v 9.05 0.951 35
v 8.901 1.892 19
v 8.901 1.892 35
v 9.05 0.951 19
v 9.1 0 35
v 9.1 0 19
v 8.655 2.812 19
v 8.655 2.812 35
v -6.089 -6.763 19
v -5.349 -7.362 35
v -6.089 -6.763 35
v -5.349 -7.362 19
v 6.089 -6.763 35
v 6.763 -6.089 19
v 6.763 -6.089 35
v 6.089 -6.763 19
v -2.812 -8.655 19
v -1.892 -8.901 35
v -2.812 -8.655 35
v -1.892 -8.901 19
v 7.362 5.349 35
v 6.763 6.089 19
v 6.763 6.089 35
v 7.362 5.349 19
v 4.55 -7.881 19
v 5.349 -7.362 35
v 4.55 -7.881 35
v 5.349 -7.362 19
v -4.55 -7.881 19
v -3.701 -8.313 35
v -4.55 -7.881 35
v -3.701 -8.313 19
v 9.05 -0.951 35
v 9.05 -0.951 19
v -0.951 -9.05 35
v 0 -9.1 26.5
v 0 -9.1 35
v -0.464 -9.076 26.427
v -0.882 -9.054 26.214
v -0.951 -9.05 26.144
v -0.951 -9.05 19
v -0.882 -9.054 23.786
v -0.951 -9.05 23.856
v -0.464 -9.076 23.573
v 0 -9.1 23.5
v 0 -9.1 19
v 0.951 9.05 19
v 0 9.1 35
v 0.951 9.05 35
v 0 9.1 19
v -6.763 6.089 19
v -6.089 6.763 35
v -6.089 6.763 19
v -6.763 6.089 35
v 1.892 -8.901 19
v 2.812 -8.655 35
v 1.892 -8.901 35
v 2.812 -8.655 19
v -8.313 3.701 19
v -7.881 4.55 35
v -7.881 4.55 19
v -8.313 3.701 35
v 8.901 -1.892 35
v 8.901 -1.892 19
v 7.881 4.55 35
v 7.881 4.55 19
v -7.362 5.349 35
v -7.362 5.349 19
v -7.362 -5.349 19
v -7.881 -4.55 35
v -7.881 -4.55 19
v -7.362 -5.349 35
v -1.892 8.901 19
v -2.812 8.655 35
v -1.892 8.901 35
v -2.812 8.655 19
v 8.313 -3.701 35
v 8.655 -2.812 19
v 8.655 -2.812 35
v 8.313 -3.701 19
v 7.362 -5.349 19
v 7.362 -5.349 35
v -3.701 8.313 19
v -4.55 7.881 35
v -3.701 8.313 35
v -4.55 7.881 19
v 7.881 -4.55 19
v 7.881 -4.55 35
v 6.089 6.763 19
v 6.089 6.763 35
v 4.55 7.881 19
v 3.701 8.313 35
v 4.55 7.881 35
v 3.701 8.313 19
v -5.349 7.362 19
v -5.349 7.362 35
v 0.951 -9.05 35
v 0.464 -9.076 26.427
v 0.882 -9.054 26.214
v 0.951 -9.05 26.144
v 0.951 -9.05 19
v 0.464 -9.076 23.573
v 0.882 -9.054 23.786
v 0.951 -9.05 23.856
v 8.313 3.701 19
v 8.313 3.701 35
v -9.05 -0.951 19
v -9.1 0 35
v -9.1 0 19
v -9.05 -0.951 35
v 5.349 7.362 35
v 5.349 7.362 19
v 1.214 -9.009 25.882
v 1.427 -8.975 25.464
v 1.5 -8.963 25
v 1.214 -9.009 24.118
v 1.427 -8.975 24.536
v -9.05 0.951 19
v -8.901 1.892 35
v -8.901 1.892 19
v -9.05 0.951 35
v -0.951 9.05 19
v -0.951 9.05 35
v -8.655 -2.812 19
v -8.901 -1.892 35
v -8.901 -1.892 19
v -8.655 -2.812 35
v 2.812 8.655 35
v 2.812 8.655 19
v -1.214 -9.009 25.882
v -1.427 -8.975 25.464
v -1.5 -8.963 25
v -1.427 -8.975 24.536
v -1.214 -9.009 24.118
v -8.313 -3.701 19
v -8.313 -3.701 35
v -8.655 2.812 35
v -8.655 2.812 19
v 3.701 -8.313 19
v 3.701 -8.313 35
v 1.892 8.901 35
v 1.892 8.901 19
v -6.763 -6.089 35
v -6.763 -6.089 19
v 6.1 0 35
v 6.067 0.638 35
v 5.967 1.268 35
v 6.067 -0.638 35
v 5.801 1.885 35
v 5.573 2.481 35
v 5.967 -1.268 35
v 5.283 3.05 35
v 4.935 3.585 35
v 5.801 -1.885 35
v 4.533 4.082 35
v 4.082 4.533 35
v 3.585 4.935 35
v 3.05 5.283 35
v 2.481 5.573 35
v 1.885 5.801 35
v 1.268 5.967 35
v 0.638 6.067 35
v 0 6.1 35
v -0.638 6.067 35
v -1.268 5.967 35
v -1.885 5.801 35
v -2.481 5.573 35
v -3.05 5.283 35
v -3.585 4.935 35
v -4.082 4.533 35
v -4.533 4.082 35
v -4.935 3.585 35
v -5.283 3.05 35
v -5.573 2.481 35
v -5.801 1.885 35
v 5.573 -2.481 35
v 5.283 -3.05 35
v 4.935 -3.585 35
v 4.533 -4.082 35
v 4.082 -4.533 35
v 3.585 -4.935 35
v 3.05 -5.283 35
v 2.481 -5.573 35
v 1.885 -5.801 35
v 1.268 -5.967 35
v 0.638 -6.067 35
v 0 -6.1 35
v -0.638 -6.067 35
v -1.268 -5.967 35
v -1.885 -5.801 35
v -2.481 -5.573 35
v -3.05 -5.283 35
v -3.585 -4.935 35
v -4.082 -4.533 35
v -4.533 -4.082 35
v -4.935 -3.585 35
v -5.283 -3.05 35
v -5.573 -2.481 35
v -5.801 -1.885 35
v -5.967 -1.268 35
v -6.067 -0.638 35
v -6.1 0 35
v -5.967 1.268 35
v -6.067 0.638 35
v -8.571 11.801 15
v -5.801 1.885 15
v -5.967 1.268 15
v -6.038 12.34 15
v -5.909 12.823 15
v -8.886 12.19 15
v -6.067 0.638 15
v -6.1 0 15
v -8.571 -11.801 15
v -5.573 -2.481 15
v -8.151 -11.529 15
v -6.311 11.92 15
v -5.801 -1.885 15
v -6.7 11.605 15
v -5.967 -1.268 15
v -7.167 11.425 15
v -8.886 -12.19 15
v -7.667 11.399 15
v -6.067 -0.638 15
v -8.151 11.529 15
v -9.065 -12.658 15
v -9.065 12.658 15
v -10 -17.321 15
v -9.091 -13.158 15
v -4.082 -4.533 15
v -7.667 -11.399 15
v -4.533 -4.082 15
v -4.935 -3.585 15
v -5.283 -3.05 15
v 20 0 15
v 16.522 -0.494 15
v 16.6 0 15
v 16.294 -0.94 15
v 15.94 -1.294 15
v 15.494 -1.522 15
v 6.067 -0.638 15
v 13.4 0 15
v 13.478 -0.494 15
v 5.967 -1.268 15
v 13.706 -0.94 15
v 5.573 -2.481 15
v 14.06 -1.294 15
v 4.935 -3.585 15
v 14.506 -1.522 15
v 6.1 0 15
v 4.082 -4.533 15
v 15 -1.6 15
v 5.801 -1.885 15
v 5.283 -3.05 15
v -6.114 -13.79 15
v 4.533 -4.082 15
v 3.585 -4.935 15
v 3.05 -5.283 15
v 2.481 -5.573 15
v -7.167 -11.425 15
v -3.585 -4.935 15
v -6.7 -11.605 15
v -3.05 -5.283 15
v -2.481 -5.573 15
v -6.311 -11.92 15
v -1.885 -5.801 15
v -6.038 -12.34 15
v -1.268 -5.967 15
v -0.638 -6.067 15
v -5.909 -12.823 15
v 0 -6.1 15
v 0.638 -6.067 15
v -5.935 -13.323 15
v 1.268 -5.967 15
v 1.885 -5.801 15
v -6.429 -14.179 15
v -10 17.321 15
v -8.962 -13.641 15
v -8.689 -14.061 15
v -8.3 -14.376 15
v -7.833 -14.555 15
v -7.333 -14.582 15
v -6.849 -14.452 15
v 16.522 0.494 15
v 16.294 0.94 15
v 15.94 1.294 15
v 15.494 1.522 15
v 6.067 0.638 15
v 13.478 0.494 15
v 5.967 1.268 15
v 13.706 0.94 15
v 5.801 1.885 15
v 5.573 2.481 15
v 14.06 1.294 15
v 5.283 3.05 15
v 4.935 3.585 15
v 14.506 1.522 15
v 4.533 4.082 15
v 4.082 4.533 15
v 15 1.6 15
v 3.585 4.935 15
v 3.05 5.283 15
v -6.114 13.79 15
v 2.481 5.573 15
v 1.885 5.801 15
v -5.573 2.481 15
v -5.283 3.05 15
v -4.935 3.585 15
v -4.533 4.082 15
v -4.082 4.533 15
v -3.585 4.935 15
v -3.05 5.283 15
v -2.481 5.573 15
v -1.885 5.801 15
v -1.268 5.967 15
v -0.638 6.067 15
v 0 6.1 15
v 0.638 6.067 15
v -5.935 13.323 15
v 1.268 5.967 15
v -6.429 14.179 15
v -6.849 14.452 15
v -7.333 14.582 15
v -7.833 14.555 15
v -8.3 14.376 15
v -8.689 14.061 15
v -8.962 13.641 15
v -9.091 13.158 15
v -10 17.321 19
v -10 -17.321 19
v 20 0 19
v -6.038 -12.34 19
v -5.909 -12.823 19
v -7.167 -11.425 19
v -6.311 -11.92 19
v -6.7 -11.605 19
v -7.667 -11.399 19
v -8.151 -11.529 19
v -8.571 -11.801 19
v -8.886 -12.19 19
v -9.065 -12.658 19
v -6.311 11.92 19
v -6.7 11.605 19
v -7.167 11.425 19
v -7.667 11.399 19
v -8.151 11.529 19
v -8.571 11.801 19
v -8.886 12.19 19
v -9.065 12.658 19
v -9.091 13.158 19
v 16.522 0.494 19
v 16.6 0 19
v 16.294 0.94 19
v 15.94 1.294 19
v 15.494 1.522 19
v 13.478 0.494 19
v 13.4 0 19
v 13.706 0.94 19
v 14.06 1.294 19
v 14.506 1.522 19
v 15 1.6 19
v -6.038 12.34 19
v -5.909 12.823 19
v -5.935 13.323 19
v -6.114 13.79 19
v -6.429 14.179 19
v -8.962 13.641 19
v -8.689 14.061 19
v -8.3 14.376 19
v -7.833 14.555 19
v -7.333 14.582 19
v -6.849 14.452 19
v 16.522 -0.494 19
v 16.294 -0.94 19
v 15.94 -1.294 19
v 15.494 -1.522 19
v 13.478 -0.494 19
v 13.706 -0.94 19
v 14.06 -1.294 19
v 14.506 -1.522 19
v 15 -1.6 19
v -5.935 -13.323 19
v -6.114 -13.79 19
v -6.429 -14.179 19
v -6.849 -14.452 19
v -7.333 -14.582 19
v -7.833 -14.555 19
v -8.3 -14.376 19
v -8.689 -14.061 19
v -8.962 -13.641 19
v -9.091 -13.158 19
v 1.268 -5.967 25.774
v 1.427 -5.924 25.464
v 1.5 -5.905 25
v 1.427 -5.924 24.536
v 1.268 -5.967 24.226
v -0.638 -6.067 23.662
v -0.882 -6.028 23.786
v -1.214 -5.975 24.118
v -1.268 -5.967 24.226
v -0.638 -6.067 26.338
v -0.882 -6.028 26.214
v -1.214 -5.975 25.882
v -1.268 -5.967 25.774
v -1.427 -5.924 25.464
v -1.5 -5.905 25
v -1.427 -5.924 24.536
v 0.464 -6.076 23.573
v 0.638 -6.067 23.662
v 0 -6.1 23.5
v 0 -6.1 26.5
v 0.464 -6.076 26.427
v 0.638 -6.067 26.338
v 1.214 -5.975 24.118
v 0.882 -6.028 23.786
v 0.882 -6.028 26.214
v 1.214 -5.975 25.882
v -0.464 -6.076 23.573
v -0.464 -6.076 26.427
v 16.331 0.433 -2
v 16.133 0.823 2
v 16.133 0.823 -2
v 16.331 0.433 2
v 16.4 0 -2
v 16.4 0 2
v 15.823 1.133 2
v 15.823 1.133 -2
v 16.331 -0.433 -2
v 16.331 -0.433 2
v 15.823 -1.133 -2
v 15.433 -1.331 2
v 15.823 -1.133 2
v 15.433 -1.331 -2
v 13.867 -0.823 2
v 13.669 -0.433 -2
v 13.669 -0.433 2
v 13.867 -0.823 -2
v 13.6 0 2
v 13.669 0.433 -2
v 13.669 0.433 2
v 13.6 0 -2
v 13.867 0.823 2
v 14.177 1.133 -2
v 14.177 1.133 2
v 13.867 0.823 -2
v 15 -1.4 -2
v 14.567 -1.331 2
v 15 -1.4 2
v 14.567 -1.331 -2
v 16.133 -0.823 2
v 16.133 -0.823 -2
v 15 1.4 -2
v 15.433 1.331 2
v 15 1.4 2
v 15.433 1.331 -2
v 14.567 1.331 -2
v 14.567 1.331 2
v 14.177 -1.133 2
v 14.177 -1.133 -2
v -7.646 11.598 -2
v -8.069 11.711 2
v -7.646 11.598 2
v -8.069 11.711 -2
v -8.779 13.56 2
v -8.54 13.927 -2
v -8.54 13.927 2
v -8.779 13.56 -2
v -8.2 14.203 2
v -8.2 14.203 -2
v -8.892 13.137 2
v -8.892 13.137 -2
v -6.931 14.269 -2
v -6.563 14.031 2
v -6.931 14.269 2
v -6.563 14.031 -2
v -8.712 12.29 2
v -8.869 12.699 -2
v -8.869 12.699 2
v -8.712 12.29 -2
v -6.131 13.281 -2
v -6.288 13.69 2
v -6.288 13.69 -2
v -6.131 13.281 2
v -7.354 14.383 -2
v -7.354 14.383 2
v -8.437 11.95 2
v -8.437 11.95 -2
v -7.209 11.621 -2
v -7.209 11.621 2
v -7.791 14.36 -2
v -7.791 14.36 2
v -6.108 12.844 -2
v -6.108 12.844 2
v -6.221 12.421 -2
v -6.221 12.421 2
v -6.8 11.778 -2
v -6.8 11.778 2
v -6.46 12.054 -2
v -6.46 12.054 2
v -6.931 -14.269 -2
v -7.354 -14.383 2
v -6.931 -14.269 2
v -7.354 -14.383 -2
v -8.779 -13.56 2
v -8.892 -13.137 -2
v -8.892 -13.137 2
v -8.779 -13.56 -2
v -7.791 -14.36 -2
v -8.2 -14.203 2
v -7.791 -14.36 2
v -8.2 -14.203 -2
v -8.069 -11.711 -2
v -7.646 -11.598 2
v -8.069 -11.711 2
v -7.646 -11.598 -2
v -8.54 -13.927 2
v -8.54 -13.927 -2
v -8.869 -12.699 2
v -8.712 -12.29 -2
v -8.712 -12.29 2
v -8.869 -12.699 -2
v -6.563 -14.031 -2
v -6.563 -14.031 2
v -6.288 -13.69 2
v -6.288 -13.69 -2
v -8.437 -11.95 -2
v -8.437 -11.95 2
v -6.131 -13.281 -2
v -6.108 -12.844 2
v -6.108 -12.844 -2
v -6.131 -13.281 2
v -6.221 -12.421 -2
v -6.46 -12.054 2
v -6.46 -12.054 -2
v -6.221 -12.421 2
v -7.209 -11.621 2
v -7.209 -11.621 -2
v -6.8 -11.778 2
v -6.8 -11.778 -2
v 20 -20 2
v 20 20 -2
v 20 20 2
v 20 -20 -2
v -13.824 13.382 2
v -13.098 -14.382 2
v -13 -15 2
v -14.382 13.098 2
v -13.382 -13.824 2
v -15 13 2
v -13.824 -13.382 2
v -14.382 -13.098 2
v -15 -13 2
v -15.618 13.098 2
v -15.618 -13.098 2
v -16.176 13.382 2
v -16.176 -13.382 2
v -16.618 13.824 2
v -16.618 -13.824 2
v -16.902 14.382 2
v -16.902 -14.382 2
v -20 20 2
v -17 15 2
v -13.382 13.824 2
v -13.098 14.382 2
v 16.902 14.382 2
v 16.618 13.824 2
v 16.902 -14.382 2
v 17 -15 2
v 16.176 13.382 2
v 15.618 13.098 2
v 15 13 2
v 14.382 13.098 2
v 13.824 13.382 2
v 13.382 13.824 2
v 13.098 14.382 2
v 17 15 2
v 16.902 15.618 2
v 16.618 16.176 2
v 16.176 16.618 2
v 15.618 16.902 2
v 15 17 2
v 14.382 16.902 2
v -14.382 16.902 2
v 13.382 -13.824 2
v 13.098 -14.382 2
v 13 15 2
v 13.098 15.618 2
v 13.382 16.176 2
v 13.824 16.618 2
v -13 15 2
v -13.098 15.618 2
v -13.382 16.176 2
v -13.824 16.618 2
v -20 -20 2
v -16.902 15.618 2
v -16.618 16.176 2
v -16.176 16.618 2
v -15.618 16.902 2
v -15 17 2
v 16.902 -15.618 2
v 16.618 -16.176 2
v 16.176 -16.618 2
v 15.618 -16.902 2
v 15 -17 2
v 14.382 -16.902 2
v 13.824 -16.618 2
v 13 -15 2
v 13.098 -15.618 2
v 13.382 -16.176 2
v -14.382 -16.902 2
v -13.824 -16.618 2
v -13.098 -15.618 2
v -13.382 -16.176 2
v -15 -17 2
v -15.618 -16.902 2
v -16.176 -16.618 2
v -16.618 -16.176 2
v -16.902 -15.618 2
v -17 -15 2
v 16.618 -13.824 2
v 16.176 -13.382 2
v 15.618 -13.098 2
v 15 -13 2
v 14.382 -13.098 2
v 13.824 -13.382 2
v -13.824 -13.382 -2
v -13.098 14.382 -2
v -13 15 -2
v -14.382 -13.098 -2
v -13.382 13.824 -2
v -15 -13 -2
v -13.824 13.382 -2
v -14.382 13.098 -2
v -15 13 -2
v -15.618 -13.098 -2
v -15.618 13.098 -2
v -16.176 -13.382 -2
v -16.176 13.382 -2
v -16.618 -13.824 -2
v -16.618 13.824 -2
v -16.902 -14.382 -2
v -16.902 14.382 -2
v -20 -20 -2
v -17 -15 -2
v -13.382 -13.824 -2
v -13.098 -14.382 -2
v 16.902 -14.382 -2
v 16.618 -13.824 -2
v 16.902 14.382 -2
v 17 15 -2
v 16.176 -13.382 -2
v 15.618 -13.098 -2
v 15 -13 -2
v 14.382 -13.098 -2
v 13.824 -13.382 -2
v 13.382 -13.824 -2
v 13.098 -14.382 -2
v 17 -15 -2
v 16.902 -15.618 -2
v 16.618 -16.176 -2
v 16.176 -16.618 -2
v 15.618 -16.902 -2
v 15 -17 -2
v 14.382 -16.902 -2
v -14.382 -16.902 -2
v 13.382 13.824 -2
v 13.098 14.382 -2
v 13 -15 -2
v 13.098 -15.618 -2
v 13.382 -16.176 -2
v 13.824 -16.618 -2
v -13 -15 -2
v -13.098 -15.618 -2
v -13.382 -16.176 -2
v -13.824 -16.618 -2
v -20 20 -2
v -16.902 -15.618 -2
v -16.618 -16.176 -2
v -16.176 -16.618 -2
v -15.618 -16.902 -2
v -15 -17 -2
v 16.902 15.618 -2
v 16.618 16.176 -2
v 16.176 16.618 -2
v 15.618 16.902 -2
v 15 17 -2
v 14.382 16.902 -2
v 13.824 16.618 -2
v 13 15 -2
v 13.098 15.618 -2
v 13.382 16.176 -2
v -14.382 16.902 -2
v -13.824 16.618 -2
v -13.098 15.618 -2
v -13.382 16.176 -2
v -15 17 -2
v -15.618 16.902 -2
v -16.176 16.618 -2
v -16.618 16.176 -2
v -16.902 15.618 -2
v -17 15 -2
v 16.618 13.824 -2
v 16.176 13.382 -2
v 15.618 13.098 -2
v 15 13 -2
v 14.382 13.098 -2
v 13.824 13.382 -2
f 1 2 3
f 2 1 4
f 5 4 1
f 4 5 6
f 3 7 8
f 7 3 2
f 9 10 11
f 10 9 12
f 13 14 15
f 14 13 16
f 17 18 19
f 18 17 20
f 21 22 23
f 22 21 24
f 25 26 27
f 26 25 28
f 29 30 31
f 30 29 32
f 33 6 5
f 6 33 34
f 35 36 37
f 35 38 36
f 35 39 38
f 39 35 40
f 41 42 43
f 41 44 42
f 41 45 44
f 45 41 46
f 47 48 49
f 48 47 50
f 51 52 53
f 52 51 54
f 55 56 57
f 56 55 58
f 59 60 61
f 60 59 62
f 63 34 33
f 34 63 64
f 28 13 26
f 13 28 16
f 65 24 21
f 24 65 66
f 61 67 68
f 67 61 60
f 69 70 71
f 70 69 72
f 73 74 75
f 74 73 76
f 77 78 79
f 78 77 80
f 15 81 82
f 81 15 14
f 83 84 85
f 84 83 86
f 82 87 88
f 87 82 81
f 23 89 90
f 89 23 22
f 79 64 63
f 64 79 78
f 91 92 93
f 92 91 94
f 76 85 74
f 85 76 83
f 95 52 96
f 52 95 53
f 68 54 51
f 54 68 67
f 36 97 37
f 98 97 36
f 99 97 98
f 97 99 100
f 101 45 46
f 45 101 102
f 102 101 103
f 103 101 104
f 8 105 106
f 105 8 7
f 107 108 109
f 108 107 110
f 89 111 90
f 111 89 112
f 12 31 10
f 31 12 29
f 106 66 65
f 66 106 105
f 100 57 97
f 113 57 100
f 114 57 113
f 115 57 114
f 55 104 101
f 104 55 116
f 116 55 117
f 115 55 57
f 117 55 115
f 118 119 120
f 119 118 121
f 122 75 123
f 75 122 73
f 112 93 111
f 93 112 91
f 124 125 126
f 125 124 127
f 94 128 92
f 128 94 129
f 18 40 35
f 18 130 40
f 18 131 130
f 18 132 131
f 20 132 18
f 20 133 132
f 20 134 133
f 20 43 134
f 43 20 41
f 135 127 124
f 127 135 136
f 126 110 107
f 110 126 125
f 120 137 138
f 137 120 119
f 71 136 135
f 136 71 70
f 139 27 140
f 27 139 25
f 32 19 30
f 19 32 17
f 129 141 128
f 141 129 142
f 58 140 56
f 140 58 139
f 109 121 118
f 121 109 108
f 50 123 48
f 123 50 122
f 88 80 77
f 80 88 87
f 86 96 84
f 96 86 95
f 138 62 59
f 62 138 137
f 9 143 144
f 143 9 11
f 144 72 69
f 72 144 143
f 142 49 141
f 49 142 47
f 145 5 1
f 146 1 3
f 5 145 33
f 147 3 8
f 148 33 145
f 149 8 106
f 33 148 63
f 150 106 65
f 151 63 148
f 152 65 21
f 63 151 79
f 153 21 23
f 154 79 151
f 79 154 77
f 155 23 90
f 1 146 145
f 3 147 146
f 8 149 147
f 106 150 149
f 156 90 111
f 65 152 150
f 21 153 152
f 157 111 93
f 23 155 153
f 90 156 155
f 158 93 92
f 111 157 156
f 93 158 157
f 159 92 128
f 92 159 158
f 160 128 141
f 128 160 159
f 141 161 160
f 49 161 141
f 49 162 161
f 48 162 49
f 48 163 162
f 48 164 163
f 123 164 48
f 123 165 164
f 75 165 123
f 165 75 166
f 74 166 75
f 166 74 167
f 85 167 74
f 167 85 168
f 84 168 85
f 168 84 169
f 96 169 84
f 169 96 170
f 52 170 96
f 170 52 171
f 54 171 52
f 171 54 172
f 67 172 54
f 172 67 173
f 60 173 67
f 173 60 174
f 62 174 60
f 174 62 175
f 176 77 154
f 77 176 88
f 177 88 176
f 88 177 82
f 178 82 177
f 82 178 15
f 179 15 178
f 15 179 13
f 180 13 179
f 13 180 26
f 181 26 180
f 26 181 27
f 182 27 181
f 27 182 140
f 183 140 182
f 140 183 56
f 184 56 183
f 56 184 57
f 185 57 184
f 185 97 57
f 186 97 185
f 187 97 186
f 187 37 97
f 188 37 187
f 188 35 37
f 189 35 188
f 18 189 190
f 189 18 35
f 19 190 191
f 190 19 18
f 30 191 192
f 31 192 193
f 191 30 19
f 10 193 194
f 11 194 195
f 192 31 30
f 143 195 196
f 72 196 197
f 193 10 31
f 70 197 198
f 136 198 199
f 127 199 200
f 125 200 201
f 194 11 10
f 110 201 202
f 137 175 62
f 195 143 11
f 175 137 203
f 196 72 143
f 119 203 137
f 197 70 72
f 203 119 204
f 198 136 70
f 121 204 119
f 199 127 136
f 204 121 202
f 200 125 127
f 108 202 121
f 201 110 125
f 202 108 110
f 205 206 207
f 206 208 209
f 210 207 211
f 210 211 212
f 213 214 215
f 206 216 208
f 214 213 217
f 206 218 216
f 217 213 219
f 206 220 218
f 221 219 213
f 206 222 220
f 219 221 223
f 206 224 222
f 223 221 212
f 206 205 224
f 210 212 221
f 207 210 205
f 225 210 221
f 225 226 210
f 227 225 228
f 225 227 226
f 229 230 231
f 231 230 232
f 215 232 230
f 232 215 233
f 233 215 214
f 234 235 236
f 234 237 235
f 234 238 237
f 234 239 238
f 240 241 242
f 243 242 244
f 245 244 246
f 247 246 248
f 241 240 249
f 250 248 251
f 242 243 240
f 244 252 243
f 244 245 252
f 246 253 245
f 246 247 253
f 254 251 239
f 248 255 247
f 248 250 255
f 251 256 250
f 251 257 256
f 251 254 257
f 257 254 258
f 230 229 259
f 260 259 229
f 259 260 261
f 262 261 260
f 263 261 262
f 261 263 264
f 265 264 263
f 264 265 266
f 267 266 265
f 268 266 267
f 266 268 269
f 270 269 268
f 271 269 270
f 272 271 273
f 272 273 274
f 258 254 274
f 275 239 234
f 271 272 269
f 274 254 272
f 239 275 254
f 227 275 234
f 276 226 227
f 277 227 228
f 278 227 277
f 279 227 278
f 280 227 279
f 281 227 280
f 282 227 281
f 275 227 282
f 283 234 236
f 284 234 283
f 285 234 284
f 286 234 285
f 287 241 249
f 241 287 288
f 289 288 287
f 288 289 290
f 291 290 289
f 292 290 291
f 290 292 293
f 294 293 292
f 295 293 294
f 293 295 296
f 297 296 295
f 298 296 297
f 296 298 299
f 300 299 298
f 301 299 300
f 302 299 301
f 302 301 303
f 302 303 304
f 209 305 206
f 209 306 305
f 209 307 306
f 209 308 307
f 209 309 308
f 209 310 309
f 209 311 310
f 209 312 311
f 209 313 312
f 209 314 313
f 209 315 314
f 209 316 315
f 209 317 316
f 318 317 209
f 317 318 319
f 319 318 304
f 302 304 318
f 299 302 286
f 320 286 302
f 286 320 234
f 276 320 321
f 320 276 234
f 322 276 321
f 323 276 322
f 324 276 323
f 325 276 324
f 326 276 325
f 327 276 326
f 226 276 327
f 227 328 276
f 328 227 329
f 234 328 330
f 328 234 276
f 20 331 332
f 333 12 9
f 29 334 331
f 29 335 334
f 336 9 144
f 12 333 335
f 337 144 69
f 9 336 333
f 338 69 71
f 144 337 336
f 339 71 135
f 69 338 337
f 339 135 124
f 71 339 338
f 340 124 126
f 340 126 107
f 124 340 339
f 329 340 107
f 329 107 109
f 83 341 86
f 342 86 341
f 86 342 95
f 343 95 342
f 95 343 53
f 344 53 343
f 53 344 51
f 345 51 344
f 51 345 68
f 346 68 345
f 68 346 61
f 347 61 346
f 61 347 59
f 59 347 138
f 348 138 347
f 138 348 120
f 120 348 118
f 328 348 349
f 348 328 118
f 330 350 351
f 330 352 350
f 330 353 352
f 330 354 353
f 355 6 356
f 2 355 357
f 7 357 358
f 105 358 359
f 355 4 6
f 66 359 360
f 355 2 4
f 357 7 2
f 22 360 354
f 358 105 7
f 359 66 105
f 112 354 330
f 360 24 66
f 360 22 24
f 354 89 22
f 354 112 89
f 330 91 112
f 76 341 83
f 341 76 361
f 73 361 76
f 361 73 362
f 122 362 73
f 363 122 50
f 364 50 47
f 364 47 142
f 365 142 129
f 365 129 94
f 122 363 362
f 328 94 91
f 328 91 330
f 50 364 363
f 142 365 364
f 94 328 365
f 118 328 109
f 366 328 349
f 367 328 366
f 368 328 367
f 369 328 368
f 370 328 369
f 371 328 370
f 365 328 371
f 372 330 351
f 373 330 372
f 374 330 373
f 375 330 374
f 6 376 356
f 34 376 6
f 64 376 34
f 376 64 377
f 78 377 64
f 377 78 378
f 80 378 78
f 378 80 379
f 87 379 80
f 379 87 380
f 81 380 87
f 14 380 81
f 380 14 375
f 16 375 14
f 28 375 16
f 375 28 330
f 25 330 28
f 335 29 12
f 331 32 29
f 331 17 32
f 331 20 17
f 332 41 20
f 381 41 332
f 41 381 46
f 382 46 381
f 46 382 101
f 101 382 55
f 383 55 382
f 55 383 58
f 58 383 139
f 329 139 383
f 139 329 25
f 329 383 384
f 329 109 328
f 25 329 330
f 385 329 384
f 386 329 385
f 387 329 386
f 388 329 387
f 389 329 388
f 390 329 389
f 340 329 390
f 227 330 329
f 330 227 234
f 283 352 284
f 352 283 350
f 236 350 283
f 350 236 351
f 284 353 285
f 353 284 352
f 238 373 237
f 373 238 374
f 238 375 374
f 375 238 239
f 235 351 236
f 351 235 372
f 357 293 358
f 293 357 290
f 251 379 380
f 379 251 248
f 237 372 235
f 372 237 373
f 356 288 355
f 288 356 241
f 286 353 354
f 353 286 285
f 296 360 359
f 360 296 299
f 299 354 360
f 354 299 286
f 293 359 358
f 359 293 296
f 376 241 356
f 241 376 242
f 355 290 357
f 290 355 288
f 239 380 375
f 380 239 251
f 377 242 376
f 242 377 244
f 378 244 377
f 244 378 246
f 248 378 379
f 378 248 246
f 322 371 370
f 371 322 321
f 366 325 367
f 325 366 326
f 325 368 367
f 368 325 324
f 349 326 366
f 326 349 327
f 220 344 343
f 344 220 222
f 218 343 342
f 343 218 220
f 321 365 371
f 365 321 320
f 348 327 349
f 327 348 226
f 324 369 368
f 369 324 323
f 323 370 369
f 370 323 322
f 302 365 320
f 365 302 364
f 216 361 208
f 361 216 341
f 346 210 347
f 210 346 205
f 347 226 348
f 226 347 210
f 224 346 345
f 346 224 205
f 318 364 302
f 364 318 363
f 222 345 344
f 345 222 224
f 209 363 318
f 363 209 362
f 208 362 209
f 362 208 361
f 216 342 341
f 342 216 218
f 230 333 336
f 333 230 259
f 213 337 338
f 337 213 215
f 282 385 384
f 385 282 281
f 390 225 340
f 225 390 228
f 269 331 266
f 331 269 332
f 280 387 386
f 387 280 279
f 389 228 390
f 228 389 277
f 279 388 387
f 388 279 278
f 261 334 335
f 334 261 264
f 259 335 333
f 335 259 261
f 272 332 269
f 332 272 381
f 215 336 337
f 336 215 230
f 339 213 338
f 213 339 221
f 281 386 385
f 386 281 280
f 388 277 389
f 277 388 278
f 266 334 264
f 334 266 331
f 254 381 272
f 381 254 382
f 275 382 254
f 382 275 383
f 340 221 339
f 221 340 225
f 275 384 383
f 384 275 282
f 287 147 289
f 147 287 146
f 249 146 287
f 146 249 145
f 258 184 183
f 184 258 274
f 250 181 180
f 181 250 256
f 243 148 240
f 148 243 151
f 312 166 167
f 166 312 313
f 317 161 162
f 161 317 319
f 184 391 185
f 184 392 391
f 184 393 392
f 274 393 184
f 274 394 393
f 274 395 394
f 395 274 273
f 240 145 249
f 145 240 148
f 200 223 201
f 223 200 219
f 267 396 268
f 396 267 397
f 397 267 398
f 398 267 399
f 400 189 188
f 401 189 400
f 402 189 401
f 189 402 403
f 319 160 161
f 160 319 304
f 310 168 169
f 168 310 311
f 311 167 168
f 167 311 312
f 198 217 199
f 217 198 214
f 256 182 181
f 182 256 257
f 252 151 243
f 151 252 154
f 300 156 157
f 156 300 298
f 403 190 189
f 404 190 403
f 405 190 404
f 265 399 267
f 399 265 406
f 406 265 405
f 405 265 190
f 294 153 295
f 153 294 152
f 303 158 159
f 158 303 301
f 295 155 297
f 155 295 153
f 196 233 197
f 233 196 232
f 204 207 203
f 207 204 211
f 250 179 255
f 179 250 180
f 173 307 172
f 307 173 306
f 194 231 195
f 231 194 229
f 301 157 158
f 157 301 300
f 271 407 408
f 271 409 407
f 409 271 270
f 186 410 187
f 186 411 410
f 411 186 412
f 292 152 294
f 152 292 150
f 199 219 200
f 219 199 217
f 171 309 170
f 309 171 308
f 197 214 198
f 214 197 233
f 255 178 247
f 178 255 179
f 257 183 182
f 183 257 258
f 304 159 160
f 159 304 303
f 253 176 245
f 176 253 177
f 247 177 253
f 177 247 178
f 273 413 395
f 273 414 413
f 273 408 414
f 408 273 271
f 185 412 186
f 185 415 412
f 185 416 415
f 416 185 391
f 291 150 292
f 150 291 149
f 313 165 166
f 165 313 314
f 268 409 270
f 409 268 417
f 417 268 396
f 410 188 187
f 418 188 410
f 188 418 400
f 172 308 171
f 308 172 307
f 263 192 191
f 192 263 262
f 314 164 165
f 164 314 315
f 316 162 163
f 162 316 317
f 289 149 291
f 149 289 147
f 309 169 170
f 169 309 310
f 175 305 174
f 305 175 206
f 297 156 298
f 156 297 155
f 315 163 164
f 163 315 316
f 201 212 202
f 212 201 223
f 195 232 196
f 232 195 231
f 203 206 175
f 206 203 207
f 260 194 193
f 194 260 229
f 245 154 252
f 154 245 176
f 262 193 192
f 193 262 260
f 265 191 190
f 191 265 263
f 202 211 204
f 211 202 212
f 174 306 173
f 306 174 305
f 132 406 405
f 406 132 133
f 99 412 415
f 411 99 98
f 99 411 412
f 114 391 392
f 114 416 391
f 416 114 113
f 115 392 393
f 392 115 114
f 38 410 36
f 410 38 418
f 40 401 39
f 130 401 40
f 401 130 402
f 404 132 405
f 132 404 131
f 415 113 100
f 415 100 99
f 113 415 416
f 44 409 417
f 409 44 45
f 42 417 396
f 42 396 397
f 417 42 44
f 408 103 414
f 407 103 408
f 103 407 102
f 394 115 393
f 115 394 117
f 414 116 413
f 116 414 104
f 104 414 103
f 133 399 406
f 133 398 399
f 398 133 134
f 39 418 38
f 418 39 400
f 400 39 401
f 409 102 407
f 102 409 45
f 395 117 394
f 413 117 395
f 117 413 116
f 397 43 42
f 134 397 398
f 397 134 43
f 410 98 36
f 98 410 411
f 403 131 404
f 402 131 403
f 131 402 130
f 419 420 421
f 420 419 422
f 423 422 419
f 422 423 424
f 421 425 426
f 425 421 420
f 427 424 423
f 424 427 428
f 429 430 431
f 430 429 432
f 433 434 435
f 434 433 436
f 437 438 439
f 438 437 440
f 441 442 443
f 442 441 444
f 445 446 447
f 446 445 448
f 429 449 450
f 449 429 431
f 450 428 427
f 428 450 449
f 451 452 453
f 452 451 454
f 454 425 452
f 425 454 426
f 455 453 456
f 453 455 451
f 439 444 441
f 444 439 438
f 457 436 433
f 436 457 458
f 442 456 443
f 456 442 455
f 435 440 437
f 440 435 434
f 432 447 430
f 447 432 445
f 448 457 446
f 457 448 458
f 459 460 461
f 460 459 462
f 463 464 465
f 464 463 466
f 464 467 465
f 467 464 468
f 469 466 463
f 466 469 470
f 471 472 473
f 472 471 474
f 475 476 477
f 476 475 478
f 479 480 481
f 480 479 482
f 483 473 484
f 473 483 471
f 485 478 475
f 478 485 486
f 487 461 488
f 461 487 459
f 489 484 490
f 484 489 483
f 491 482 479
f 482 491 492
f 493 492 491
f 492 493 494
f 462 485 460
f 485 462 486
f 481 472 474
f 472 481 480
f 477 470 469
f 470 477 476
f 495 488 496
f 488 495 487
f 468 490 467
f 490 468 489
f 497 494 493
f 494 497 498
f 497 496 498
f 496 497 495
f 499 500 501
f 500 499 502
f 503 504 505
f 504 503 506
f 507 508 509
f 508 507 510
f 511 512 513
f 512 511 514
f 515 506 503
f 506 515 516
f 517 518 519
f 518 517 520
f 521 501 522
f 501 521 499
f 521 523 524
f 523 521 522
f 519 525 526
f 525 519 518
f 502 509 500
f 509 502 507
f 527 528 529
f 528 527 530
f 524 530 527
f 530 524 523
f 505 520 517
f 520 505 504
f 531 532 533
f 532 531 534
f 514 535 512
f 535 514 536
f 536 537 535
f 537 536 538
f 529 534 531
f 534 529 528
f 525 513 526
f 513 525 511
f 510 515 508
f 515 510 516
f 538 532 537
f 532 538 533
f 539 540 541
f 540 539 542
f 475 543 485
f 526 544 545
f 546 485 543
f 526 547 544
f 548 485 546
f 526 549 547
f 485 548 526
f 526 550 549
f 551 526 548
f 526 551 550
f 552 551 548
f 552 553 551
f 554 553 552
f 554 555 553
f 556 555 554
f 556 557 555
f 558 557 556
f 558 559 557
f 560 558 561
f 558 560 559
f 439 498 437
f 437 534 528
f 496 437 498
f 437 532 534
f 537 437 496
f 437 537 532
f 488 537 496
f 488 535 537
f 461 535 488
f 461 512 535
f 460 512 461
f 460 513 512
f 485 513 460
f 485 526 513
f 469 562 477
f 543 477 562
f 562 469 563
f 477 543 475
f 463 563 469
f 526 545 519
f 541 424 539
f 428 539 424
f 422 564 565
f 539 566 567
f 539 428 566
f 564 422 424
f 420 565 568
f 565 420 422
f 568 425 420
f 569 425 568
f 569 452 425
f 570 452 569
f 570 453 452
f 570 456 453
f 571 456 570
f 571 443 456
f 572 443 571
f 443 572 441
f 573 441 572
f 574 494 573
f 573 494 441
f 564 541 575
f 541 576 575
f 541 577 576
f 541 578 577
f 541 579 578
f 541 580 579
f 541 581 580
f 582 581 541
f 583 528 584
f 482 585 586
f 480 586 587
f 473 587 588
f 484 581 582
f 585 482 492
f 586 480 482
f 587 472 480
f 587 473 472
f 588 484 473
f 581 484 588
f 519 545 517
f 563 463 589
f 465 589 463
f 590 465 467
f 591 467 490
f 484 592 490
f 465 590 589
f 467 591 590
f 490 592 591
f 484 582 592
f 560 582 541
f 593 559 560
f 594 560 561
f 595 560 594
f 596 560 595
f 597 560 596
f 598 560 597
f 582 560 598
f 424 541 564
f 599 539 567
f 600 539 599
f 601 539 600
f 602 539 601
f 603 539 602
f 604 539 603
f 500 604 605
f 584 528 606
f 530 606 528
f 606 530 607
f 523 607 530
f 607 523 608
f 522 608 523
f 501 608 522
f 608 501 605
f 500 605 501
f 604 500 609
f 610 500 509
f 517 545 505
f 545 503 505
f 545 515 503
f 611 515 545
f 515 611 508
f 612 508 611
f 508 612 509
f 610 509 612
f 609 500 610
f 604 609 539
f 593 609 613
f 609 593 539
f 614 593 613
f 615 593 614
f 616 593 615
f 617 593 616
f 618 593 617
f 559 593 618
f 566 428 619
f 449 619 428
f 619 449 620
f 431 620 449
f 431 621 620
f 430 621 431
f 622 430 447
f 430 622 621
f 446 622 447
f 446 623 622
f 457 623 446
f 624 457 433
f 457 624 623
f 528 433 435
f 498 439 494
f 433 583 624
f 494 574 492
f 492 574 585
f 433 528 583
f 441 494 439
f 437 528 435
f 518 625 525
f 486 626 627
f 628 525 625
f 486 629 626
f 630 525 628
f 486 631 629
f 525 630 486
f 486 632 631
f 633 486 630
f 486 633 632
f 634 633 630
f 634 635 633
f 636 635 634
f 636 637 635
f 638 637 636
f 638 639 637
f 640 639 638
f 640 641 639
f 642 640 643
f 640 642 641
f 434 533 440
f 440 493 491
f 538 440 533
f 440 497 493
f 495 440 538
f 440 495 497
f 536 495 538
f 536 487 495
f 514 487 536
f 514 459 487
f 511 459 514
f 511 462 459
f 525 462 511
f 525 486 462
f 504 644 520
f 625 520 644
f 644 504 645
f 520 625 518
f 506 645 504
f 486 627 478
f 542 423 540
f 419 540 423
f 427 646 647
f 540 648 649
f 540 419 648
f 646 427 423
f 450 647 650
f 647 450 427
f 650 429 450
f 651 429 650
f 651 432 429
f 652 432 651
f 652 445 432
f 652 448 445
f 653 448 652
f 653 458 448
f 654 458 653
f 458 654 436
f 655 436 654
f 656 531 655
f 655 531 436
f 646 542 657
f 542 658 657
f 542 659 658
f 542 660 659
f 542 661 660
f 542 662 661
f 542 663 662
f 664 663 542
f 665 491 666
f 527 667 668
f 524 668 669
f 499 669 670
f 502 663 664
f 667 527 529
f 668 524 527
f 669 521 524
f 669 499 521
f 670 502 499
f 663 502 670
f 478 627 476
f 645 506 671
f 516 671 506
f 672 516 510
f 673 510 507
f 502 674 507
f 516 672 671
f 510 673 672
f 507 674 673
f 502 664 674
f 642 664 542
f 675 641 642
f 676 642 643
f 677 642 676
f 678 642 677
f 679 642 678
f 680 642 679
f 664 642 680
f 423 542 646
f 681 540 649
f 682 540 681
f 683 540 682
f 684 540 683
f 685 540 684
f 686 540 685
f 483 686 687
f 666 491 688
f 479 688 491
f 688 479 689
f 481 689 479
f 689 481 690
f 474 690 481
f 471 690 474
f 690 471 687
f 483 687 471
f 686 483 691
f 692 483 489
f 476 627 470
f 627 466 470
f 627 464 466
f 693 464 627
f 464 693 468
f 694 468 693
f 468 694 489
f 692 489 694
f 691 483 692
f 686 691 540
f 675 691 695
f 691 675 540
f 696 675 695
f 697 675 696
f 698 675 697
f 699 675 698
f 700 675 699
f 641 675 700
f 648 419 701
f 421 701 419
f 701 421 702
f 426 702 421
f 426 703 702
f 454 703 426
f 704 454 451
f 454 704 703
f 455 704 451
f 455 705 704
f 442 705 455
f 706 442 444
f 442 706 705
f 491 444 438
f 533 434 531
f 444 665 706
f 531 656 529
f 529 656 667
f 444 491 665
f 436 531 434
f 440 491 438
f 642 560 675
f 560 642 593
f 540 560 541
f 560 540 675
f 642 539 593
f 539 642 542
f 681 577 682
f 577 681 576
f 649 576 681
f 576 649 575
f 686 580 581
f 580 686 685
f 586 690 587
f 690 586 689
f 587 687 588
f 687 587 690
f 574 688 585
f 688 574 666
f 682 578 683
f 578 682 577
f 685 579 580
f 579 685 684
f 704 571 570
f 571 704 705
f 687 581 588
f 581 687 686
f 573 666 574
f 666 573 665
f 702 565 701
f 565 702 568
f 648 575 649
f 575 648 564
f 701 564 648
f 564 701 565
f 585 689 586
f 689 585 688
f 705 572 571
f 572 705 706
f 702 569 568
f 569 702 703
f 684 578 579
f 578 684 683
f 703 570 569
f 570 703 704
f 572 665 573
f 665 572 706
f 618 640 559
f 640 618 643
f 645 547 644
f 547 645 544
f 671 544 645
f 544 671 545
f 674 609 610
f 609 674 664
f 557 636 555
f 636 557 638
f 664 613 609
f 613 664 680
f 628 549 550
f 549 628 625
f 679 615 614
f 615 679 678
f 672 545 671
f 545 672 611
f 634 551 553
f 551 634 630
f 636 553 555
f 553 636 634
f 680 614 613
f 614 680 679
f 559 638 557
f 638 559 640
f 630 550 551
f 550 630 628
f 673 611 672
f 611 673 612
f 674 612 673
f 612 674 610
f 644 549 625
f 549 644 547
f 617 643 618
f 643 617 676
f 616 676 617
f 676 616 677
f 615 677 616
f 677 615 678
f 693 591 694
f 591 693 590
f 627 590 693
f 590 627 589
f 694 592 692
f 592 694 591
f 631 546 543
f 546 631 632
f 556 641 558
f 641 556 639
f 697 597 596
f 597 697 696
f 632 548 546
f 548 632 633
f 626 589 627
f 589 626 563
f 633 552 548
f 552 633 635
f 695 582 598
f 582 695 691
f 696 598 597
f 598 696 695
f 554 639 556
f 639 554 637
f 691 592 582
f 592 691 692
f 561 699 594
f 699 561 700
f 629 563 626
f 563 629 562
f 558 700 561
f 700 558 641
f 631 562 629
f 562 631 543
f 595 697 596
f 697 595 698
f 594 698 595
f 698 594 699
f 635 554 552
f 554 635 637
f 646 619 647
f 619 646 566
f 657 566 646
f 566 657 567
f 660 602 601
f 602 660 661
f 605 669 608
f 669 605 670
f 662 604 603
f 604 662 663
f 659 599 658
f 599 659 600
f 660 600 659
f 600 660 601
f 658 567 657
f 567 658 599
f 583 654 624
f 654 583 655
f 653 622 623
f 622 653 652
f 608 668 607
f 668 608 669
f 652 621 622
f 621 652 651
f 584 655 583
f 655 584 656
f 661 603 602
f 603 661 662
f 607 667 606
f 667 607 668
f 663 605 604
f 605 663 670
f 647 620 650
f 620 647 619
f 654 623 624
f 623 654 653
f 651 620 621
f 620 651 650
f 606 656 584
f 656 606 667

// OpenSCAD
// TERNARY OPTICAL COMPUTER - LASER TURRET MODULE
// Designed for "Plug and Play" Modular Breadboard
// Features: 3-Point Kinematic Tilt Adjustment (Tripod Style)

// --- PARAMETERS ---
laser_diameter = 12.2; // Standard 12mm Brass Module (use 6.2 for TO-18)
wall_thickness = 3;
base_width = 40;
base_length = 40;
screw_hole = 3.2; // M3 Clearance

// --- MODULES ---

module laser_holder() {
    difference() {
        // Main Body
        union() {
            cylinder(h=20, d=laser_diameter + (wall_thickness*2), $fn=60);
            // Flange for adjustment screws
            translate([0,0,0]) cylinder(h=4, r=20, $fn=3); // Triangular base
        }
        
        // Laser Hole
        translate([0,0,-1]) cylinder(h=22, d=laser_diameter, $fn=60);
        
        // Set Screw for Laser
        translate([0,0,10]) rotate([90,0,0]) cylinder(h=20, d=3, center=false, $fn=20);
        
        // Adjustment Screw Holes (Tripod Pattern)
        for(i=[0:120:240]) {
            rotate([0,0,i]) translate([15,0,-1]) cylinder(h=10, d=screw_hole, $fn=20);
        }
    }
}

module base_plate() {
    difference() {
        cube([base_width, base_length, 4], center=true);
        
        // Mounting Holes to Breadboard
        translate([15, 15, 0]) cylinder(h=10, d=4, center=true, $fn=20);
        translate([-15, -15, 0]) cylinder(h=10, d=4, center=true, $fn=20);
        translate([-15, 15, 0]) cylinder(h=10, d=4, center=true, $fn=20);
        translate([15, -15, 0]) cylinder(h=10, d=4, center=true, $fn=20);

        // Adjustment Screw Receivers (for M3 nuts or self-tap)
        for(i=[0:120:240]) {
            rotate([0,0,i]) translate([15,0,0]) cylinder(h=10, d=2.8, center=true, $fn=20); // Tight for tapping
        }
    }
}

// --- ASSEMBLY ---
// Translate to show exploded view
translate([0,0,15]) color("Cyan") laser_holder();
color("Gray") base_plate();

// --- INSTRUCTIONS ---
// 1. Print 1x Base and 1x Holder per laser.
// 2. Insert M3x20mm screws through Holder -> Spring -> Base.
// 3. Tightening screws independently aims the laser.
